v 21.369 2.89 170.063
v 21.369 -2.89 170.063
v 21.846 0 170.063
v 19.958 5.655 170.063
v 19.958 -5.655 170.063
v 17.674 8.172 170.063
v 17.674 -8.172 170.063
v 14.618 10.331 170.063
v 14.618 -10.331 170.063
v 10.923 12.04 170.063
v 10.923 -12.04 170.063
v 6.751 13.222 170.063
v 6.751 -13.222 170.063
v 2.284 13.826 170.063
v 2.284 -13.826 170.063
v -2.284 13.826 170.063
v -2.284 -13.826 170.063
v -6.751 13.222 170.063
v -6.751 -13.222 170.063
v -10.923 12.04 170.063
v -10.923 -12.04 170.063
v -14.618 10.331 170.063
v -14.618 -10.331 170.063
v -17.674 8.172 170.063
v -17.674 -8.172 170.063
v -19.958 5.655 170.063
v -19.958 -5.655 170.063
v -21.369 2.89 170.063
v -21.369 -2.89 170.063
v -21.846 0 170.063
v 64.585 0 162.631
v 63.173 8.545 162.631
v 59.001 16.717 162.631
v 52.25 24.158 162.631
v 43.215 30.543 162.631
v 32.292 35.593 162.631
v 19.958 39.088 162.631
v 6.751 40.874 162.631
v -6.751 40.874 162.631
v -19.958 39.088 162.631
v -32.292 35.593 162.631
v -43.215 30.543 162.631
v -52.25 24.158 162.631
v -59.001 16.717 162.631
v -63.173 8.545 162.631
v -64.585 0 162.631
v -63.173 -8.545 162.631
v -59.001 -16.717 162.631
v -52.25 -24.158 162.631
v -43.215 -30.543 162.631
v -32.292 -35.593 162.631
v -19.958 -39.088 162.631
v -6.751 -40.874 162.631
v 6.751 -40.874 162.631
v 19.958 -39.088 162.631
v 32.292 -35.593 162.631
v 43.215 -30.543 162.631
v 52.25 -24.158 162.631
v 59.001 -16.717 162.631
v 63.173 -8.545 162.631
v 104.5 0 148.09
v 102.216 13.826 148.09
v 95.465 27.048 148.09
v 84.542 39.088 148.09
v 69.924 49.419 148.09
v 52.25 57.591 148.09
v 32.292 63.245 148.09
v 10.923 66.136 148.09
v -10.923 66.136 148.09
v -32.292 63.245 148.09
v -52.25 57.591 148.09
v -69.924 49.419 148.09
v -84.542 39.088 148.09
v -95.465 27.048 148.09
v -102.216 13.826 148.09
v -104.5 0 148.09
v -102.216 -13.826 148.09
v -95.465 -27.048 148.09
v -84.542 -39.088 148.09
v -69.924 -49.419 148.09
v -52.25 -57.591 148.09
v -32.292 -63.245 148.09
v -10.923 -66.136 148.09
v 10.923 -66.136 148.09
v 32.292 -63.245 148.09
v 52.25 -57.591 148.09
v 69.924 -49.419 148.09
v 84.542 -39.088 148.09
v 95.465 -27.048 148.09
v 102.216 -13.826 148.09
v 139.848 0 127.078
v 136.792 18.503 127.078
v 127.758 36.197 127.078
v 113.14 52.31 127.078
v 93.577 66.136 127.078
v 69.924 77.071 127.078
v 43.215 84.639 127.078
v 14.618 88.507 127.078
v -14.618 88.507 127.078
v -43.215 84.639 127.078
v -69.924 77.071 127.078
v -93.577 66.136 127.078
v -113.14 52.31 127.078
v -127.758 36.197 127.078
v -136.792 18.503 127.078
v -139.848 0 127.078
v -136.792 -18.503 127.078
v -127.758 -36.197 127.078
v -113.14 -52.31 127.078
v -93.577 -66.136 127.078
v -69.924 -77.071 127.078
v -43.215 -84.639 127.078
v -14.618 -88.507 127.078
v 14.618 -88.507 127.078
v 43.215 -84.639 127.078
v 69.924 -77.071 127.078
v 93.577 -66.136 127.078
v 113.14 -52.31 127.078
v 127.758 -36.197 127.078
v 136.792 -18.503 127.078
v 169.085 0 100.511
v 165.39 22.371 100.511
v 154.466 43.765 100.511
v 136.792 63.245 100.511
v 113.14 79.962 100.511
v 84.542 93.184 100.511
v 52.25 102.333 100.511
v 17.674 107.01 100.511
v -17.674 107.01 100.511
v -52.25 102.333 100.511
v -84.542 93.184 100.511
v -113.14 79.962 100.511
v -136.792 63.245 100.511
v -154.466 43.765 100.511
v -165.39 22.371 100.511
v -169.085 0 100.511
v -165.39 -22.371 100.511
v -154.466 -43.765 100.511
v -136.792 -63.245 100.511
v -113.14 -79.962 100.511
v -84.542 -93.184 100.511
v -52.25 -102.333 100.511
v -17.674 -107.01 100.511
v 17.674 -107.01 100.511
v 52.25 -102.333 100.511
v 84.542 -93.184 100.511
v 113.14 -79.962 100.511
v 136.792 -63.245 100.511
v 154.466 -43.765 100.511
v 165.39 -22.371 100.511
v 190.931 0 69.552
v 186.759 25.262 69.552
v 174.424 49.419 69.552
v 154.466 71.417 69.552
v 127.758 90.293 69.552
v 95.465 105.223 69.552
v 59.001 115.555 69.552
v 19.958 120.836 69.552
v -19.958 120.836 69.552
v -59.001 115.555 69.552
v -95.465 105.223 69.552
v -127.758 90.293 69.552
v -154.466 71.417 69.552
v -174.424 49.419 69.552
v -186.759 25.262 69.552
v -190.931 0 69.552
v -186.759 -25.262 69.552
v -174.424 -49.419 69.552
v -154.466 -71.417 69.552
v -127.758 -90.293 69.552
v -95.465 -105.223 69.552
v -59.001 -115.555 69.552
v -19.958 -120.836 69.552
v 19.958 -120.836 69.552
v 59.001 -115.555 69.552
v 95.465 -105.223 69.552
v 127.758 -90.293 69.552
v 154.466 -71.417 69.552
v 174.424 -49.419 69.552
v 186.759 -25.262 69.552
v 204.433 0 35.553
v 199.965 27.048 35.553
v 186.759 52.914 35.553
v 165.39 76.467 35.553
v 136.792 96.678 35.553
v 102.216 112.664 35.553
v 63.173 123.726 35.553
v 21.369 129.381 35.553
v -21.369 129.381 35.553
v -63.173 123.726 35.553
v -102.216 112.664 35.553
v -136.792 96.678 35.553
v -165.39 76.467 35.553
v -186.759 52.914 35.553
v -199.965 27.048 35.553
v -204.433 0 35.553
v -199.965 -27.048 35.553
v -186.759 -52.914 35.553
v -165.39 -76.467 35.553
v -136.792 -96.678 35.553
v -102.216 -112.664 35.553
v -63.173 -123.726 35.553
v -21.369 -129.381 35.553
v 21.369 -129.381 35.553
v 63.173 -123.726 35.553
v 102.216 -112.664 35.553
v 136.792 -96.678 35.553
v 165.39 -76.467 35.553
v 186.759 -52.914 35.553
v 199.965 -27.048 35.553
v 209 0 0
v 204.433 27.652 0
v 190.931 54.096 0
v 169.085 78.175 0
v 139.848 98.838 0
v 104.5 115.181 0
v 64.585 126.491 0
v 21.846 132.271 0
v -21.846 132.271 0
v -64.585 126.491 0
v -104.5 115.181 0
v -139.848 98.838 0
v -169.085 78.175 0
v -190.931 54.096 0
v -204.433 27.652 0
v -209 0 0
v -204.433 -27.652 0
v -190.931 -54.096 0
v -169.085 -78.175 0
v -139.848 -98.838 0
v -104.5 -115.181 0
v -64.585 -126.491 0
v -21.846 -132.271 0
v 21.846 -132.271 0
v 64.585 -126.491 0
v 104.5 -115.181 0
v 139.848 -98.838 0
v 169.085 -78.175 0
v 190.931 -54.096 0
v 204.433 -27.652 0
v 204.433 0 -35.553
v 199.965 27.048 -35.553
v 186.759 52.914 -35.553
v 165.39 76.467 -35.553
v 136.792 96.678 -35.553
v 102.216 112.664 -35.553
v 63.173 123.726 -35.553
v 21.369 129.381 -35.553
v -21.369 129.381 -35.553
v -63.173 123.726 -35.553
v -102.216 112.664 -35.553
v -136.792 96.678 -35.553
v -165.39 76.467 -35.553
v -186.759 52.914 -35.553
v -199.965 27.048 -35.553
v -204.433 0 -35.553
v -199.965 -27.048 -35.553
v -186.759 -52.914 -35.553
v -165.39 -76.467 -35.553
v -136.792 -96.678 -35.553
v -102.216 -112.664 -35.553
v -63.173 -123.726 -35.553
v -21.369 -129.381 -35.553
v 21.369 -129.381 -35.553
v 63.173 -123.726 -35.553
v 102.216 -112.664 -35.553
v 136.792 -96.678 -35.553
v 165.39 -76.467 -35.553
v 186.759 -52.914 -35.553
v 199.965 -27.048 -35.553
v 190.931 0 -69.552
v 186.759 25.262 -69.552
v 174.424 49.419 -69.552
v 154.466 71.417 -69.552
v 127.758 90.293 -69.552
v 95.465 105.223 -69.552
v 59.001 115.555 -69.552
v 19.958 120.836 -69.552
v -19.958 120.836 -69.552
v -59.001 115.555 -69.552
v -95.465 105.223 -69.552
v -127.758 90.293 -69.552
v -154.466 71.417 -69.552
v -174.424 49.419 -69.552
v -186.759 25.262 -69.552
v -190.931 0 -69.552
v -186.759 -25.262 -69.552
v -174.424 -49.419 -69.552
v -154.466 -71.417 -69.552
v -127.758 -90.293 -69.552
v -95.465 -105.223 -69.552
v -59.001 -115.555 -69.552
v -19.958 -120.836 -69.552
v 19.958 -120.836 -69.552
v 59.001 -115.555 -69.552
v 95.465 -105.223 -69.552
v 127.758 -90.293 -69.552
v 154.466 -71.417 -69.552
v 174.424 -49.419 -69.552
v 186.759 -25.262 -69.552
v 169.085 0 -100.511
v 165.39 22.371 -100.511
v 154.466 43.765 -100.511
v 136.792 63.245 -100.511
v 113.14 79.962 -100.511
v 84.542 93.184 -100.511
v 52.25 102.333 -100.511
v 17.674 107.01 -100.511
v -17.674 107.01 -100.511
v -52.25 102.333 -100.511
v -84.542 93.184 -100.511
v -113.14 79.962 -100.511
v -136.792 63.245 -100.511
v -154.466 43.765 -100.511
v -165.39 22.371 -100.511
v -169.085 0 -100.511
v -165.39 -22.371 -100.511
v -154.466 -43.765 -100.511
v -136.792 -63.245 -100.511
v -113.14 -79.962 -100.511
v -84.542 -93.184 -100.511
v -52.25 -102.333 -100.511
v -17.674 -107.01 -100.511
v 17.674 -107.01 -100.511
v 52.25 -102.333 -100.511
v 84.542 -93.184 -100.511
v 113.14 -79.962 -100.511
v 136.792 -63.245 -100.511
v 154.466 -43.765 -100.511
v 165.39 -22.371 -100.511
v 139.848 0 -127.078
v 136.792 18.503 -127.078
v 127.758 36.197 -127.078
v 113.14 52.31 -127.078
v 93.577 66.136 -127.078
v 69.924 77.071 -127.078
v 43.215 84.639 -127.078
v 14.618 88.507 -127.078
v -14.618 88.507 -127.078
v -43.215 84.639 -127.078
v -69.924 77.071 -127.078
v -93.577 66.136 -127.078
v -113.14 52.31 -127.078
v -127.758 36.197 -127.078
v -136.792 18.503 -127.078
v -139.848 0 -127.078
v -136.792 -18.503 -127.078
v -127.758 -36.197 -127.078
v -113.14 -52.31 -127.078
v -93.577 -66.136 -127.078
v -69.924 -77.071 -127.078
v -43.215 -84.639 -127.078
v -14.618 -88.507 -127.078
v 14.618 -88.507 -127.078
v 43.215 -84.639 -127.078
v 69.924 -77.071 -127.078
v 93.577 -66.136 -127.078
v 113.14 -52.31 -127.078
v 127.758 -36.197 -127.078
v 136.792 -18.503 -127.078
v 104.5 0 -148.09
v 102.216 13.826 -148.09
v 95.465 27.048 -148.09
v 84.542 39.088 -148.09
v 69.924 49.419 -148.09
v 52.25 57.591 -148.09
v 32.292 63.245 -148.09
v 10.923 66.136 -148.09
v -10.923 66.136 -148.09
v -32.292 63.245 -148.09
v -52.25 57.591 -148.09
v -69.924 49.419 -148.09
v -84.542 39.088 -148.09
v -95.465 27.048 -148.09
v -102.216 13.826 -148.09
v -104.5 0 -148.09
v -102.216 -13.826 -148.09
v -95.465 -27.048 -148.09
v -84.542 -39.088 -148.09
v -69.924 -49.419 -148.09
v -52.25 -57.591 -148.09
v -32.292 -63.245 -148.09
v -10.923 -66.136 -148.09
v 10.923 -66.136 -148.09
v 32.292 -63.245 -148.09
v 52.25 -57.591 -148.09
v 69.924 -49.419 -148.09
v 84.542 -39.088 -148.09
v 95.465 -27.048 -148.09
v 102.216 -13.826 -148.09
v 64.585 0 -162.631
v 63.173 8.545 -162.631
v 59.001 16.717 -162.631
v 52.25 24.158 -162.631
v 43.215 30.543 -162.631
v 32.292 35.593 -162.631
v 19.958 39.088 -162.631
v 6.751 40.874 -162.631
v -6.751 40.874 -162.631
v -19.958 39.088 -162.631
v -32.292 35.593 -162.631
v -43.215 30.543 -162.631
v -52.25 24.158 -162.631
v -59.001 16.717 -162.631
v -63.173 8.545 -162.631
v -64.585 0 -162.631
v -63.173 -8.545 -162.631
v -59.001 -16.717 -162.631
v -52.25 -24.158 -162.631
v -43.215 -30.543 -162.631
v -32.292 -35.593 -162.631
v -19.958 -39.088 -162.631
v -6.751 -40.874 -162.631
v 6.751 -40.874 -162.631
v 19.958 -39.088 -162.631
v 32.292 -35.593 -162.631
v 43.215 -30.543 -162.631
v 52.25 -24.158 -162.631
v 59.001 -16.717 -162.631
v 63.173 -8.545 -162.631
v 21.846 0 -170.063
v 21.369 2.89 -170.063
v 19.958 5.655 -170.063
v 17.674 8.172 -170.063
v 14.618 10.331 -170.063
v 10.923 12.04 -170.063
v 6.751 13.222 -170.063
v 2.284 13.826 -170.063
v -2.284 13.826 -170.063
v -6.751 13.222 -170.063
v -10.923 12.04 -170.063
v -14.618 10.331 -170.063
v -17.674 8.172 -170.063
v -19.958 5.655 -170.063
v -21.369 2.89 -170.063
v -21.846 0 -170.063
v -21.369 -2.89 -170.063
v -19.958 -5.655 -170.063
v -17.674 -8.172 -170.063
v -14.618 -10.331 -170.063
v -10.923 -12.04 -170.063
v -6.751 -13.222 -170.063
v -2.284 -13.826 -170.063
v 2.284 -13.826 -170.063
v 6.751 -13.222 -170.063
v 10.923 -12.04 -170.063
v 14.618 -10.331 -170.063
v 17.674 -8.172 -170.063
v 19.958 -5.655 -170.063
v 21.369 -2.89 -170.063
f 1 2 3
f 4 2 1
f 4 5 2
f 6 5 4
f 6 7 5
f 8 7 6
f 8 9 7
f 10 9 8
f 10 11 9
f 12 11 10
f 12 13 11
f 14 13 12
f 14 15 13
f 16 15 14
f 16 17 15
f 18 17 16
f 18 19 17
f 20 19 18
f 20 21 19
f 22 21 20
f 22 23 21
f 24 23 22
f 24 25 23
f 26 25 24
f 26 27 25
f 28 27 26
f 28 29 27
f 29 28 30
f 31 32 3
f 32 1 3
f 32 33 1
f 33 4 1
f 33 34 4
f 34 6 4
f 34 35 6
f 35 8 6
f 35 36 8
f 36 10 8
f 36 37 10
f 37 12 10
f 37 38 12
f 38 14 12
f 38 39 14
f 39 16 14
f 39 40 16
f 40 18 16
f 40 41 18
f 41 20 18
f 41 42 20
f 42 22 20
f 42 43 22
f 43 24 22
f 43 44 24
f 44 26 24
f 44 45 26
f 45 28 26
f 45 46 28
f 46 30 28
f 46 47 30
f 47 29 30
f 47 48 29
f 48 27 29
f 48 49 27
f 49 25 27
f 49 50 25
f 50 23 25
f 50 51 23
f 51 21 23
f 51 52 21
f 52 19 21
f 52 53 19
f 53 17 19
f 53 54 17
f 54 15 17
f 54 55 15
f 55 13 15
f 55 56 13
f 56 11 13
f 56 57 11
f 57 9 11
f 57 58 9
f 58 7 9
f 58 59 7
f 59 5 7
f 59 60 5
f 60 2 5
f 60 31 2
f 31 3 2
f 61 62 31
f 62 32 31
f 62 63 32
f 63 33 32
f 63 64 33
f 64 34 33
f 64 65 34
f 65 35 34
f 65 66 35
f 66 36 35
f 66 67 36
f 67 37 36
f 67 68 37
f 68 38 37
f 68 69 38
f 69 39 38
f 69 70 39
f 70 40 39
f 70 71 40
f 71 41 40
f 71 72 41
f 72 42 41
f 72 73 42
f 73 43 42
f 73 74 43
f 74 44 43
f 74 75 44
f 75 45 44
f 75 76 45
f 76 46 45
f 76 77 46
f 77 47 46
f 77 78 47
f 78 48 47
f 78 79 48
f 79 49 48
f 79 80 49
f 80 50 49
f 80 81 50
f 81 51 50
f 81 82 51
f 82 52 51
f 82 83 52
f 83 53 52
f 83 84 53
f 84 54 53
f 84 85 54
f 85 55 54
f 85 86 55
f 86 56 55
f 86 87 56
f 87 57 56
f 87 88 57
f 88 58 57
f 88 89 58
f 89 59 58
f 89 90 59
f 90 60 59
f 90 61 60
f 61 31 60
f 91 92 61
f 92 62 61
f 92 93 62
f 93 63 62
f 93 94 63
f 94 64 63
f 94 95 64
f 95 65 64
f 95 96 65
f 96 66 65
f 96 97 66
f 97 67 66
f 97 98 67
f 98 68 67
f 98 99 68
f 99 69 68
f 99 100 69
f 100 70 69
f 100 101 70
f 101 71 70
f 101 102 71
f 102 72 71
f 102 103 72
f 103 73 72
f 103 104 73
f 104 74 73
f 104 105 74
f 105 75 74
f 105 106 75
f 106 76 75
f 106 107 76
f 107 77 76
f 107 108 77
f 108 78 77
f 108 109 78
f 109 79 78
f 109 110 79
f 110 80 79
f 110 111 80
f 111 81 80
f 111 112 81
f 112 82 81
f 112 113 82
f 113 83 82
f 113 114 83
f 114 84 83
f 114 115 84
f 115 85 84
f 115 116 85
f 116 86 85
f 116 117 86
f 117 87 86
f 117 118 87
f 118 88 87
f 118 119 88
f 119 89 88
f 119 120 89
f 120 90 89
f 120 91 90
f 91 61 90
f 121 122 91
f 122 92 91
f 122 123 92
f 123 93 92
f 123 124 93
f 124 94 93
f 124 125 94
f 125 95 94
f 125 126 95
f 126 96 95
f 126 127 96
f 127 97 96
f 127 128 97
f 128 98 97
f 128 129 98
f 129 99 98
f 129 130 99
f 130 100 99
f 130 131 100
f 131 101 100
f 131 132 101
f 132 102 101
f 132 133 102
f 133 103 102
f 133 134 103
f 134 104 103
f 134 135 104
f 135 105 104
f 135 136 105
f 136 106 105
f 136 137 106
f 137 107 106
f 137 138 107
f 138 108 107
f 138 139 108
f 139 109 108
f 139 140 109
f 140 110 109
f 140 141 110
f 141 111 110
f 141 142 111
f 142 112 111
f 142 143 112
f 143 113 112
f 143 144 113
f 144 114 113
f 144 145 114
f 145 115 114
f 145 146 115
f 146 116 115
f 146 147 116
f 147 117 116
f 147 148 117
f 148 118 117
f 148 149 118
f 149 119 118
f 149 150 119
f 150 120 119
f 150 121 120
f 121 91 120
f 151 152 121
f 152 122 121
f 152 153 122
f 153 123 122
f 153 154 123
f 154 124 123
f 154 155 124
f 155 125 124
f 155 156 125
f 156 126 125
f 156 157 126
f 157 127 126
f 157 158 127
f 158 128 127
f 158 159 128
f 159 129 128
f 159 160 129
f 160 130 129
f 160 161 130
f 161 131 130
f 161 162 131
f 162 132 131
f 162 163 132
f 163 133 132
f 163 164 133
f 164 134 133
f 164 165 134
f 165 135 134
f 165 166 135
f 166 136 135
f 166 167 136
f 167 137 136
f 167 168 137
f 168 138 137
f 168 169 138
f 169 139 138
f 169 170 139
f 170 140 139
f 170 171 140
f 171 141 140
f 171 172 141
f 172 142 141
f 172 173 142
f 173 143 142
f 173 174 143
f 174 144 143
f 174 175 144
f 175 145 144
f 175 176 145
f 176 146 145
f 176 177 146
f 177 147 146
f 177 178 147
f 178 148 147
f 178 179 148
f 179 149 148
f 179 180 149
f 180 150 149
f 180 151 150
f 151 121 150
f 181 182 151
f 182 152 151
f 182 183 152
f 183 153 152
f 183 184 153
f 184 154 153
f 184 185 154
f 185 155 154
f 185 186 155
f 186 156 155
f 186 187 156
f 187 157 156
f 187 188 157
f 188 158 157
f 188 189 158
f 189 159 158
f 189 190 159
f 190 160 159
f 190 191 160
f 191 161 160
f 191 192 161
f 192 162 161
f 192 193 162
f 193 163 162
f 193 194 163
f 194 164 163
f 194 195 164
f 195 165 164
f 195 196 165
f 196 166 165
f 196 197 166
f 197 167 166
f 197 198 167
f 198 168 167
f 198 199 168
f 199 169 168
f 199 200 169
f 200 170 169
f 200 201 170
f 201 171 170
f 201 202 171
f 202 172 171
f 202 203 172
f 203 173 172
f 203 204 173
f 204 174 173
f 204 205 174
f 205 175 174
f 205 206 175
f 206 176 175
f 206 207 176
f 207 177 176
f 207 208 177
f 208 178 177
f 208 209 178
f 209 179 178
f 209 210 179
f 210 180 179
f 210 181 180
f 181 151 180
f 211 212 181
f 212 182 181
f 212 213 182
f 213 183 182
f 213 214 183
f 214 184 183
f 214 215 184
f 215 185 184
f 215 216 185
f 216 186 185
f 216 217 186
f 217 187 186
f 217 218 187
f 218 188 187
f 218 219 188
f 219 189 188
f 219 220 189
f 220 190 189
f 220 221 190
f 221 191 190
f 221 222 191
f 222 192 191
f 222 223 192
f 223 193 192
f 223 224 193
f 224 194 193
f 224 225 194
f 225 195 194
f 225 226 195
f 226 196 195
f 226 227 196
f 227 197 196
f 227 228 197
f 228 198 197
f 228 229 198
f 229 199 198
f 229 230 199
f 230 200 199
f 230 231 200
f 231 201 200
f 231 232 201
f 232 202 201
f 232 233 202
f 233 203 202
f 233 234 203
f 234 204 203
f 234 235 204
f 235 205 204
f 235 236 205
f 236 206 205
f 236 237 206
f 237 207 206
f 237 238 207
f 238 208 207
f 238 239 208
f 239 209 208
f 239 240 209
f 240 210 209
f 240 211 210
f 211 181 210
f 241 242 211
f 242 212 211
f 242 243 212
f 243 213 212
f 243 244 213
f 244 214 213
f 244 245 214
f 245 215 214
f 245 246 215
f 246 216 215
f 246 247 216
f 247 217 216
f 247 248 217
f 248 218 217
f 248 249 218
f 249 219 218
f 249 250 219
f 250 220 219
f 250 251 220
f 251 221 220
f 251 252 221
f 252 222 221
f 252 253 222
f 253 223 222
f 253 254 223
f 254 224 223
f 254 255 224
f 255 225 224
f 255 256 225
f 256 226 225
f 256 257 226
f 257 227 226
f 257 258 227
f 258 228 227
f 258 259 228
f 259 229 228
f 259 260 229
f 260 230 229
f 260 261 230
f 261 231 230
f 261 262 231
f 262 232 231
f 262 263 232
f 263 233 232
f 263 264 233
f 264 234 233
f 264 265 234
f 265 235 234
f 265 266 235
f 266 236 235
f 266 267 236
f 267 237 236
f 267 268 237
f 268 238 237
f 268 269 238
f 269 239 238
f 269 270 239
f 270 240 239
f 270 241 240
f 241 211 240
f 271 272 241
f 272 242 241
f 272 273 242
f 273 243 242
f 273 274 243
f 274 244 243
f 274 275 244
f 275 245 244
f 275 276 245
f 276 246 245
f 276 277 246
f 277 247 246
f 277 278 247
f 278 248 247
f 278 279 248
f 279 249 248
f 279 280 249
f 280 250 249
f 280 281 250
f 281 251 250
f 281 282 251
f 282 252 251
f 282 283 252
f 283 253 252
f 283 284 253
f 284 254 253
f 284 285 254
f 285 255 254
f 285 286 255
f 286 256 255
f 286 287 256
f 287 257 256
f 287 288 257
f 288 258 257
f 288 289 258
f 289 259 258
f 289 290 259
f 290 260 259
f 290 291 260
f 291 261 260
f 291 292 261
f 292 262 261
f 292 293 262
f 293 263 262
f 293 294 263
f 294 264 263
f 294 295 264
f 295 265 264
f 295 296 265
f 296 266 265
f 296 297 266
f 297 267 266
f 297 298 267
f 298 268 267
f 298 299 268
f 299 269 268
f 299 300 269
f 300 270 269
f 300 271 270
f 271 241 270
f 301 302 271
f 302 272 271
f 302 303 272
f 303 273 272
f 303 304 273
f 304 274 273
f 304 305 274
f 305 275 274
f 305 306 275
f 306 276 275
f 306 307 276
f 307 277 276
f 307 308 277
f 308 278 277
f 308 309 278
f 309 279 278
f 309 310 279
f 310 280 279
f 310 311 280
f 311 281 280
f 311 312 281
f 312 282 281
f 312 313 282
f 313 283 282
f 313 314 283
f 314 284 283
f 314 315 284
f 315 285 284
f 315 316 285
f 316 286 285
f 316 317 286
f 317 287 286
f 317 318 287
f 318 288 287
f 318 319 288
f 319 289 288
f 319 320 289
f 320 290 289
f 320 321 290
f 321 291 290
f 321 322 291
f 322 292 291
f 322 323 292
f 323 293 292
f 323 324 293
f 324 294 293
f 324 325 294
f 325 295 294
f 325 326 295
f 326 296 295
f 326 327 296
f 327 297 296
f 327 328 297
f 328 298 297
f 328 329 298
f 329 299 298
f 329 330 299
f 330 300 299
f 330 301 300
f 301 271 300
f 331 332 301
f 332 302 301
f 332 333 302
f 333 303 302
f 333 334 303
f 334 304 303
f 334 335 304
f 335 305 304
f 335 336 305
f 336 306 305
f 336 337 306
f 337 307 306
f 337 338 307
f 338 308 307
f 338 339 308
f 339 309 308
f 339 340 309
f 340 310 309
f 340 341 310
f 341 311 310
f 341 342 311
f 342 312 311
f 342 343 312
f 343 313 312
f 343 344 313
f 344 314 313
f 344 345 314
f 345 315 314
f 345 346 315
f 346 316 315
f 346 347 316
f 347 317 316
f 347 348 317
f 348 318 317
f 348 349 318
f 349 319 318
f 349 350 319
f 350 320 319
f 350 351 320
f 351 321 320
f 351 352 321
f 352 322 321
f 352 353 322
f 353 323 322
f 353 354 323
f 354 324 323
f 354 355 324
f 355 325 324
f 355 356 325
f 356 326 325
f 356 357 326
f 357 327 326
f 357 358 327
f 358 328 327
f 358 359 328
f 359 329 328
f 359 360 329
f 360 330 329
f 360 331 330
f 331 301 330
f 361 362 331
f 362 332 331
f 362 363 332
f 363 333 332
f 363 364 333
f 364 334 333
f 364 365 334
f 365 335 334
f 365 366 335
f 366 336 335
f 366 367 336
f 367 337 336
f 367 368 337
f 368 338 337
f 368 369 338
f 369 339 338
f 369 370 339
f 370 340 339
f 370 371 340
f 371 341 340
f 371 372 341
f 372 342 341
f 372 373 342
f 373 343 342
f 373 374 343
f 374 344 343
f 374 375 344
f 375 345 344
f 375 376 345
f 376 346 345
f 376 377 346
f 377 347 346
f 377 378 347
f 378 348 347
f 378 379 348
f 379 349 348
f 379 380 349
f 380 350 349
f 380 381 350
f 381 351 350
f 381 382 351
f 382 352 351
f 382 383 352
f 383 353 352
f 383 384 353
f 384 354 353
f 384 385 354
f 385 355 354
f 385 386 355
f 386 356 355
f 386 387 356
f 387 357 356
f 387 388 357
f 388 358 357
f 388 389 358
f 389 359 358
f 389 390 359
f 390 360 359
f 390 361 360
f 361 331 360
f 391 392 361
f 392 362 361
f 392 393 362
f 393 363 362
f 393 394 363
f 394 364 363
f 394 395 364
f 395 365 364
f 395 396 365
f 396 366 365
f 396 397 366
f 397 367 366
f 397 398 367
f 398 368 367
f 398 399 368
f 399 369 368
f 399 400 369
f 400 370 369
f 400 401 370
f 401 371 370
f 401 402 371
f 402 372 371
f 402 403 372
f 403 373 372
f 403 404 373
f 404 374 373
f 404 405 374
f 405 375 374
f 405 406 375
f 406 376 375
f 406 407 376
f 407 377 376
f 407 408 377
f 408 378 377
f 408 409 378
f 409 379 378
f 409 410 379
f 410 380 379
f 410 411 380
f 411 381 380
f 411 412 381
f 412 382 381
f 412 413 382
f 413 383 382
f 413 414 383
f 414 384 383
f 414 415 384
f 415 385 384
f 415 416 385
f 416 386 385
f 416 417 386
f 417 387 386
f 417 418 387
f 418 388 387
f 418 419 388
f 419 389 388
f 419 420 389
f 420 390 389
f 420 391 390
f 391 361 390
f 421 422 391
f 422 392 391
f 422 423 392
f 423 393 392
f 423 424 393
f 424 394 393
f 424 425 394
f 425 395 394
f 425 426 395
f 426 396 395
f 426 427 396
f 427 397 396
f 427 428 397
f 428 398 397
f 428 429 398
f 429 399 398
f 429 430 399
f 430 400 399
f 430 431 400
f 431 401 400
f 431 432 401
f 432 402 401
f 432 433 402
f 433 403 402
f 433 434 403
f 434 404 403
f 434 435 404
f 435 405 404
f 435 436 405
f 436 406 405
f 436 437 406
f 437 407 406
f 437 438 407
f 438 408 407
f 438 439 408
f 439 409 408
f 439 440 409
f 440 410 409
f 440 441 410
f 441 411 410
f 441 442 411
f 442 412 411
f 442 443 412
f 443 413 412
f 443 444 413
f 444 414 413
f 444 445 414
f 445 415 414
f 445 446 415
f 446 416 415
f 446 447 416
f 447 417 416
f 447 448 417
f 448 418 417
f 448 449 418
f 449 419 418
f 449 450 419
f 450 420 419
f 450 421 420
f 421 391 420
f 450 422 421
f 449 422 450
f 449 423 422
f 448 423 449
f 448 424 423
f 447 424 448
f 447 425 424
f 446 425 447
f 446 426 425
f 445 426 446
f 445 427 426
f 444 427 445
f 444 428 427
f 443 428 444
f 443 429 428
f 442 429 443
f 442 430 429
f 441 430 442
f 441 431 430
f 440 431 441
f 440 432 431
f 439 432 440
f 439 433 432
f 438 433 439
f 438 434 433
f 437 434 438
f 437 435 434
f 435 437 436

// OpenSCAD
// Generated by SolidPython 1.0.1 on 2020-07-29 00:46:49


scale(v = [11, 7, 9]) {
	sphere(r = 19);
}
/***********************************************
*********      SolidPython code:      **********
************************************************
 
# import packages: SolidPython
from solid import *
from solid.utils import *
from itertools import chain, combinations, permutations


class Resize:

    def __init__(self, scad_file):
        self.scad_file = scad_file
        #self.scad_file = import_scad(scad_file)
        # cone/cylinder param:
        self.r1 = 0
        self.r2 = 0
        self.h = 0
        # rectangular prism param:
        self.w = 0
        self.l = 0
        # ellipse param:
        self.r = 0

    # import OpenScad code (file name corresponds to shape)


    # classify shape + parameters
    def assign(self, param1, param2, param3):
        if self.scad_file == 'cone.scad':
            self.r1 = param1
            self.r2 = param2
            self.h = param3
        elif self.scad_file == 'cylinder.scad':
            self.r1 = param1
            self.r2 = param2
            self.h = param3
        elif self.scad_file == 'rectangularPrism.scad':
            self.h = param1
            self.l = param2
            self.w = param3
        else:
            self.r = param1
            self.h = param2

    # resize parameters
    def iterate(self):
        x = range(3, 20, 2)
        i = 1
        if self.scad_file == 'cone.scad':
            tempList = list(permutations(x, 2))
            for temp in tempList:
                param1 = temp[0]
                param2 = temp[1]
                filepath = 'produced_scad_files/' + 'cone' + str(param1) + '_' + str(param2) + '_' + '.scad'
                scad_render_to_file(cylinder(h=param1, r1=param2, r2=0), filepath)

        elif self.scad_file == 'cylinder.scad':
            tempList = list(permutations(x, 3))
            for temp in tempList:
                param1 = temp[0]
                param2 = temp[1]
                filepath = 'produced_scad_files/' + 'cylinder' + str(param1) + '_' + str(param2) + '_' + '.scad'
                scad_render_to_file(cylinder(h=param1, r1=param2, r2=param2), filepath)

        elif self.scad_file == 'rectangularPrism.scad':
            tempList = list(permutations(x, 3))
            for temp in tempList:
                param1 = temp[0]
                param2 = temp[1]
                param3 = temp[2]
                filepath = 'produced_scad_files/' + 'rectangularPrism' + str(param1) + '_' + str(param2) + '_' + str(
                    param3) + '.scad'
                scad_render_to_file(cube(size=(param1, param2, param3)), filepath)

        elif self.scad_file == 'ellipse.scad':
            tempList = list(permutations(x, 4))
            for temp in tempList:
                param1 = temp[0]
                param2 = temp[1]
                param3 = temp[2]
                param4 = temp[3]
                filepath = 'produced_scad_files/' + 'ellipse' + str(param1) + '_' + str(param2) + '_' + str(param3) + '_' + str(param4) + '.scad'
                scad_render_to_file(scale([param1, param2, param3])(sphere(r=param4)), filepath)

    def render_to_scadfile(self):
        scad_render_to_file(scad, 'example.scad') 
 
************************************************/
